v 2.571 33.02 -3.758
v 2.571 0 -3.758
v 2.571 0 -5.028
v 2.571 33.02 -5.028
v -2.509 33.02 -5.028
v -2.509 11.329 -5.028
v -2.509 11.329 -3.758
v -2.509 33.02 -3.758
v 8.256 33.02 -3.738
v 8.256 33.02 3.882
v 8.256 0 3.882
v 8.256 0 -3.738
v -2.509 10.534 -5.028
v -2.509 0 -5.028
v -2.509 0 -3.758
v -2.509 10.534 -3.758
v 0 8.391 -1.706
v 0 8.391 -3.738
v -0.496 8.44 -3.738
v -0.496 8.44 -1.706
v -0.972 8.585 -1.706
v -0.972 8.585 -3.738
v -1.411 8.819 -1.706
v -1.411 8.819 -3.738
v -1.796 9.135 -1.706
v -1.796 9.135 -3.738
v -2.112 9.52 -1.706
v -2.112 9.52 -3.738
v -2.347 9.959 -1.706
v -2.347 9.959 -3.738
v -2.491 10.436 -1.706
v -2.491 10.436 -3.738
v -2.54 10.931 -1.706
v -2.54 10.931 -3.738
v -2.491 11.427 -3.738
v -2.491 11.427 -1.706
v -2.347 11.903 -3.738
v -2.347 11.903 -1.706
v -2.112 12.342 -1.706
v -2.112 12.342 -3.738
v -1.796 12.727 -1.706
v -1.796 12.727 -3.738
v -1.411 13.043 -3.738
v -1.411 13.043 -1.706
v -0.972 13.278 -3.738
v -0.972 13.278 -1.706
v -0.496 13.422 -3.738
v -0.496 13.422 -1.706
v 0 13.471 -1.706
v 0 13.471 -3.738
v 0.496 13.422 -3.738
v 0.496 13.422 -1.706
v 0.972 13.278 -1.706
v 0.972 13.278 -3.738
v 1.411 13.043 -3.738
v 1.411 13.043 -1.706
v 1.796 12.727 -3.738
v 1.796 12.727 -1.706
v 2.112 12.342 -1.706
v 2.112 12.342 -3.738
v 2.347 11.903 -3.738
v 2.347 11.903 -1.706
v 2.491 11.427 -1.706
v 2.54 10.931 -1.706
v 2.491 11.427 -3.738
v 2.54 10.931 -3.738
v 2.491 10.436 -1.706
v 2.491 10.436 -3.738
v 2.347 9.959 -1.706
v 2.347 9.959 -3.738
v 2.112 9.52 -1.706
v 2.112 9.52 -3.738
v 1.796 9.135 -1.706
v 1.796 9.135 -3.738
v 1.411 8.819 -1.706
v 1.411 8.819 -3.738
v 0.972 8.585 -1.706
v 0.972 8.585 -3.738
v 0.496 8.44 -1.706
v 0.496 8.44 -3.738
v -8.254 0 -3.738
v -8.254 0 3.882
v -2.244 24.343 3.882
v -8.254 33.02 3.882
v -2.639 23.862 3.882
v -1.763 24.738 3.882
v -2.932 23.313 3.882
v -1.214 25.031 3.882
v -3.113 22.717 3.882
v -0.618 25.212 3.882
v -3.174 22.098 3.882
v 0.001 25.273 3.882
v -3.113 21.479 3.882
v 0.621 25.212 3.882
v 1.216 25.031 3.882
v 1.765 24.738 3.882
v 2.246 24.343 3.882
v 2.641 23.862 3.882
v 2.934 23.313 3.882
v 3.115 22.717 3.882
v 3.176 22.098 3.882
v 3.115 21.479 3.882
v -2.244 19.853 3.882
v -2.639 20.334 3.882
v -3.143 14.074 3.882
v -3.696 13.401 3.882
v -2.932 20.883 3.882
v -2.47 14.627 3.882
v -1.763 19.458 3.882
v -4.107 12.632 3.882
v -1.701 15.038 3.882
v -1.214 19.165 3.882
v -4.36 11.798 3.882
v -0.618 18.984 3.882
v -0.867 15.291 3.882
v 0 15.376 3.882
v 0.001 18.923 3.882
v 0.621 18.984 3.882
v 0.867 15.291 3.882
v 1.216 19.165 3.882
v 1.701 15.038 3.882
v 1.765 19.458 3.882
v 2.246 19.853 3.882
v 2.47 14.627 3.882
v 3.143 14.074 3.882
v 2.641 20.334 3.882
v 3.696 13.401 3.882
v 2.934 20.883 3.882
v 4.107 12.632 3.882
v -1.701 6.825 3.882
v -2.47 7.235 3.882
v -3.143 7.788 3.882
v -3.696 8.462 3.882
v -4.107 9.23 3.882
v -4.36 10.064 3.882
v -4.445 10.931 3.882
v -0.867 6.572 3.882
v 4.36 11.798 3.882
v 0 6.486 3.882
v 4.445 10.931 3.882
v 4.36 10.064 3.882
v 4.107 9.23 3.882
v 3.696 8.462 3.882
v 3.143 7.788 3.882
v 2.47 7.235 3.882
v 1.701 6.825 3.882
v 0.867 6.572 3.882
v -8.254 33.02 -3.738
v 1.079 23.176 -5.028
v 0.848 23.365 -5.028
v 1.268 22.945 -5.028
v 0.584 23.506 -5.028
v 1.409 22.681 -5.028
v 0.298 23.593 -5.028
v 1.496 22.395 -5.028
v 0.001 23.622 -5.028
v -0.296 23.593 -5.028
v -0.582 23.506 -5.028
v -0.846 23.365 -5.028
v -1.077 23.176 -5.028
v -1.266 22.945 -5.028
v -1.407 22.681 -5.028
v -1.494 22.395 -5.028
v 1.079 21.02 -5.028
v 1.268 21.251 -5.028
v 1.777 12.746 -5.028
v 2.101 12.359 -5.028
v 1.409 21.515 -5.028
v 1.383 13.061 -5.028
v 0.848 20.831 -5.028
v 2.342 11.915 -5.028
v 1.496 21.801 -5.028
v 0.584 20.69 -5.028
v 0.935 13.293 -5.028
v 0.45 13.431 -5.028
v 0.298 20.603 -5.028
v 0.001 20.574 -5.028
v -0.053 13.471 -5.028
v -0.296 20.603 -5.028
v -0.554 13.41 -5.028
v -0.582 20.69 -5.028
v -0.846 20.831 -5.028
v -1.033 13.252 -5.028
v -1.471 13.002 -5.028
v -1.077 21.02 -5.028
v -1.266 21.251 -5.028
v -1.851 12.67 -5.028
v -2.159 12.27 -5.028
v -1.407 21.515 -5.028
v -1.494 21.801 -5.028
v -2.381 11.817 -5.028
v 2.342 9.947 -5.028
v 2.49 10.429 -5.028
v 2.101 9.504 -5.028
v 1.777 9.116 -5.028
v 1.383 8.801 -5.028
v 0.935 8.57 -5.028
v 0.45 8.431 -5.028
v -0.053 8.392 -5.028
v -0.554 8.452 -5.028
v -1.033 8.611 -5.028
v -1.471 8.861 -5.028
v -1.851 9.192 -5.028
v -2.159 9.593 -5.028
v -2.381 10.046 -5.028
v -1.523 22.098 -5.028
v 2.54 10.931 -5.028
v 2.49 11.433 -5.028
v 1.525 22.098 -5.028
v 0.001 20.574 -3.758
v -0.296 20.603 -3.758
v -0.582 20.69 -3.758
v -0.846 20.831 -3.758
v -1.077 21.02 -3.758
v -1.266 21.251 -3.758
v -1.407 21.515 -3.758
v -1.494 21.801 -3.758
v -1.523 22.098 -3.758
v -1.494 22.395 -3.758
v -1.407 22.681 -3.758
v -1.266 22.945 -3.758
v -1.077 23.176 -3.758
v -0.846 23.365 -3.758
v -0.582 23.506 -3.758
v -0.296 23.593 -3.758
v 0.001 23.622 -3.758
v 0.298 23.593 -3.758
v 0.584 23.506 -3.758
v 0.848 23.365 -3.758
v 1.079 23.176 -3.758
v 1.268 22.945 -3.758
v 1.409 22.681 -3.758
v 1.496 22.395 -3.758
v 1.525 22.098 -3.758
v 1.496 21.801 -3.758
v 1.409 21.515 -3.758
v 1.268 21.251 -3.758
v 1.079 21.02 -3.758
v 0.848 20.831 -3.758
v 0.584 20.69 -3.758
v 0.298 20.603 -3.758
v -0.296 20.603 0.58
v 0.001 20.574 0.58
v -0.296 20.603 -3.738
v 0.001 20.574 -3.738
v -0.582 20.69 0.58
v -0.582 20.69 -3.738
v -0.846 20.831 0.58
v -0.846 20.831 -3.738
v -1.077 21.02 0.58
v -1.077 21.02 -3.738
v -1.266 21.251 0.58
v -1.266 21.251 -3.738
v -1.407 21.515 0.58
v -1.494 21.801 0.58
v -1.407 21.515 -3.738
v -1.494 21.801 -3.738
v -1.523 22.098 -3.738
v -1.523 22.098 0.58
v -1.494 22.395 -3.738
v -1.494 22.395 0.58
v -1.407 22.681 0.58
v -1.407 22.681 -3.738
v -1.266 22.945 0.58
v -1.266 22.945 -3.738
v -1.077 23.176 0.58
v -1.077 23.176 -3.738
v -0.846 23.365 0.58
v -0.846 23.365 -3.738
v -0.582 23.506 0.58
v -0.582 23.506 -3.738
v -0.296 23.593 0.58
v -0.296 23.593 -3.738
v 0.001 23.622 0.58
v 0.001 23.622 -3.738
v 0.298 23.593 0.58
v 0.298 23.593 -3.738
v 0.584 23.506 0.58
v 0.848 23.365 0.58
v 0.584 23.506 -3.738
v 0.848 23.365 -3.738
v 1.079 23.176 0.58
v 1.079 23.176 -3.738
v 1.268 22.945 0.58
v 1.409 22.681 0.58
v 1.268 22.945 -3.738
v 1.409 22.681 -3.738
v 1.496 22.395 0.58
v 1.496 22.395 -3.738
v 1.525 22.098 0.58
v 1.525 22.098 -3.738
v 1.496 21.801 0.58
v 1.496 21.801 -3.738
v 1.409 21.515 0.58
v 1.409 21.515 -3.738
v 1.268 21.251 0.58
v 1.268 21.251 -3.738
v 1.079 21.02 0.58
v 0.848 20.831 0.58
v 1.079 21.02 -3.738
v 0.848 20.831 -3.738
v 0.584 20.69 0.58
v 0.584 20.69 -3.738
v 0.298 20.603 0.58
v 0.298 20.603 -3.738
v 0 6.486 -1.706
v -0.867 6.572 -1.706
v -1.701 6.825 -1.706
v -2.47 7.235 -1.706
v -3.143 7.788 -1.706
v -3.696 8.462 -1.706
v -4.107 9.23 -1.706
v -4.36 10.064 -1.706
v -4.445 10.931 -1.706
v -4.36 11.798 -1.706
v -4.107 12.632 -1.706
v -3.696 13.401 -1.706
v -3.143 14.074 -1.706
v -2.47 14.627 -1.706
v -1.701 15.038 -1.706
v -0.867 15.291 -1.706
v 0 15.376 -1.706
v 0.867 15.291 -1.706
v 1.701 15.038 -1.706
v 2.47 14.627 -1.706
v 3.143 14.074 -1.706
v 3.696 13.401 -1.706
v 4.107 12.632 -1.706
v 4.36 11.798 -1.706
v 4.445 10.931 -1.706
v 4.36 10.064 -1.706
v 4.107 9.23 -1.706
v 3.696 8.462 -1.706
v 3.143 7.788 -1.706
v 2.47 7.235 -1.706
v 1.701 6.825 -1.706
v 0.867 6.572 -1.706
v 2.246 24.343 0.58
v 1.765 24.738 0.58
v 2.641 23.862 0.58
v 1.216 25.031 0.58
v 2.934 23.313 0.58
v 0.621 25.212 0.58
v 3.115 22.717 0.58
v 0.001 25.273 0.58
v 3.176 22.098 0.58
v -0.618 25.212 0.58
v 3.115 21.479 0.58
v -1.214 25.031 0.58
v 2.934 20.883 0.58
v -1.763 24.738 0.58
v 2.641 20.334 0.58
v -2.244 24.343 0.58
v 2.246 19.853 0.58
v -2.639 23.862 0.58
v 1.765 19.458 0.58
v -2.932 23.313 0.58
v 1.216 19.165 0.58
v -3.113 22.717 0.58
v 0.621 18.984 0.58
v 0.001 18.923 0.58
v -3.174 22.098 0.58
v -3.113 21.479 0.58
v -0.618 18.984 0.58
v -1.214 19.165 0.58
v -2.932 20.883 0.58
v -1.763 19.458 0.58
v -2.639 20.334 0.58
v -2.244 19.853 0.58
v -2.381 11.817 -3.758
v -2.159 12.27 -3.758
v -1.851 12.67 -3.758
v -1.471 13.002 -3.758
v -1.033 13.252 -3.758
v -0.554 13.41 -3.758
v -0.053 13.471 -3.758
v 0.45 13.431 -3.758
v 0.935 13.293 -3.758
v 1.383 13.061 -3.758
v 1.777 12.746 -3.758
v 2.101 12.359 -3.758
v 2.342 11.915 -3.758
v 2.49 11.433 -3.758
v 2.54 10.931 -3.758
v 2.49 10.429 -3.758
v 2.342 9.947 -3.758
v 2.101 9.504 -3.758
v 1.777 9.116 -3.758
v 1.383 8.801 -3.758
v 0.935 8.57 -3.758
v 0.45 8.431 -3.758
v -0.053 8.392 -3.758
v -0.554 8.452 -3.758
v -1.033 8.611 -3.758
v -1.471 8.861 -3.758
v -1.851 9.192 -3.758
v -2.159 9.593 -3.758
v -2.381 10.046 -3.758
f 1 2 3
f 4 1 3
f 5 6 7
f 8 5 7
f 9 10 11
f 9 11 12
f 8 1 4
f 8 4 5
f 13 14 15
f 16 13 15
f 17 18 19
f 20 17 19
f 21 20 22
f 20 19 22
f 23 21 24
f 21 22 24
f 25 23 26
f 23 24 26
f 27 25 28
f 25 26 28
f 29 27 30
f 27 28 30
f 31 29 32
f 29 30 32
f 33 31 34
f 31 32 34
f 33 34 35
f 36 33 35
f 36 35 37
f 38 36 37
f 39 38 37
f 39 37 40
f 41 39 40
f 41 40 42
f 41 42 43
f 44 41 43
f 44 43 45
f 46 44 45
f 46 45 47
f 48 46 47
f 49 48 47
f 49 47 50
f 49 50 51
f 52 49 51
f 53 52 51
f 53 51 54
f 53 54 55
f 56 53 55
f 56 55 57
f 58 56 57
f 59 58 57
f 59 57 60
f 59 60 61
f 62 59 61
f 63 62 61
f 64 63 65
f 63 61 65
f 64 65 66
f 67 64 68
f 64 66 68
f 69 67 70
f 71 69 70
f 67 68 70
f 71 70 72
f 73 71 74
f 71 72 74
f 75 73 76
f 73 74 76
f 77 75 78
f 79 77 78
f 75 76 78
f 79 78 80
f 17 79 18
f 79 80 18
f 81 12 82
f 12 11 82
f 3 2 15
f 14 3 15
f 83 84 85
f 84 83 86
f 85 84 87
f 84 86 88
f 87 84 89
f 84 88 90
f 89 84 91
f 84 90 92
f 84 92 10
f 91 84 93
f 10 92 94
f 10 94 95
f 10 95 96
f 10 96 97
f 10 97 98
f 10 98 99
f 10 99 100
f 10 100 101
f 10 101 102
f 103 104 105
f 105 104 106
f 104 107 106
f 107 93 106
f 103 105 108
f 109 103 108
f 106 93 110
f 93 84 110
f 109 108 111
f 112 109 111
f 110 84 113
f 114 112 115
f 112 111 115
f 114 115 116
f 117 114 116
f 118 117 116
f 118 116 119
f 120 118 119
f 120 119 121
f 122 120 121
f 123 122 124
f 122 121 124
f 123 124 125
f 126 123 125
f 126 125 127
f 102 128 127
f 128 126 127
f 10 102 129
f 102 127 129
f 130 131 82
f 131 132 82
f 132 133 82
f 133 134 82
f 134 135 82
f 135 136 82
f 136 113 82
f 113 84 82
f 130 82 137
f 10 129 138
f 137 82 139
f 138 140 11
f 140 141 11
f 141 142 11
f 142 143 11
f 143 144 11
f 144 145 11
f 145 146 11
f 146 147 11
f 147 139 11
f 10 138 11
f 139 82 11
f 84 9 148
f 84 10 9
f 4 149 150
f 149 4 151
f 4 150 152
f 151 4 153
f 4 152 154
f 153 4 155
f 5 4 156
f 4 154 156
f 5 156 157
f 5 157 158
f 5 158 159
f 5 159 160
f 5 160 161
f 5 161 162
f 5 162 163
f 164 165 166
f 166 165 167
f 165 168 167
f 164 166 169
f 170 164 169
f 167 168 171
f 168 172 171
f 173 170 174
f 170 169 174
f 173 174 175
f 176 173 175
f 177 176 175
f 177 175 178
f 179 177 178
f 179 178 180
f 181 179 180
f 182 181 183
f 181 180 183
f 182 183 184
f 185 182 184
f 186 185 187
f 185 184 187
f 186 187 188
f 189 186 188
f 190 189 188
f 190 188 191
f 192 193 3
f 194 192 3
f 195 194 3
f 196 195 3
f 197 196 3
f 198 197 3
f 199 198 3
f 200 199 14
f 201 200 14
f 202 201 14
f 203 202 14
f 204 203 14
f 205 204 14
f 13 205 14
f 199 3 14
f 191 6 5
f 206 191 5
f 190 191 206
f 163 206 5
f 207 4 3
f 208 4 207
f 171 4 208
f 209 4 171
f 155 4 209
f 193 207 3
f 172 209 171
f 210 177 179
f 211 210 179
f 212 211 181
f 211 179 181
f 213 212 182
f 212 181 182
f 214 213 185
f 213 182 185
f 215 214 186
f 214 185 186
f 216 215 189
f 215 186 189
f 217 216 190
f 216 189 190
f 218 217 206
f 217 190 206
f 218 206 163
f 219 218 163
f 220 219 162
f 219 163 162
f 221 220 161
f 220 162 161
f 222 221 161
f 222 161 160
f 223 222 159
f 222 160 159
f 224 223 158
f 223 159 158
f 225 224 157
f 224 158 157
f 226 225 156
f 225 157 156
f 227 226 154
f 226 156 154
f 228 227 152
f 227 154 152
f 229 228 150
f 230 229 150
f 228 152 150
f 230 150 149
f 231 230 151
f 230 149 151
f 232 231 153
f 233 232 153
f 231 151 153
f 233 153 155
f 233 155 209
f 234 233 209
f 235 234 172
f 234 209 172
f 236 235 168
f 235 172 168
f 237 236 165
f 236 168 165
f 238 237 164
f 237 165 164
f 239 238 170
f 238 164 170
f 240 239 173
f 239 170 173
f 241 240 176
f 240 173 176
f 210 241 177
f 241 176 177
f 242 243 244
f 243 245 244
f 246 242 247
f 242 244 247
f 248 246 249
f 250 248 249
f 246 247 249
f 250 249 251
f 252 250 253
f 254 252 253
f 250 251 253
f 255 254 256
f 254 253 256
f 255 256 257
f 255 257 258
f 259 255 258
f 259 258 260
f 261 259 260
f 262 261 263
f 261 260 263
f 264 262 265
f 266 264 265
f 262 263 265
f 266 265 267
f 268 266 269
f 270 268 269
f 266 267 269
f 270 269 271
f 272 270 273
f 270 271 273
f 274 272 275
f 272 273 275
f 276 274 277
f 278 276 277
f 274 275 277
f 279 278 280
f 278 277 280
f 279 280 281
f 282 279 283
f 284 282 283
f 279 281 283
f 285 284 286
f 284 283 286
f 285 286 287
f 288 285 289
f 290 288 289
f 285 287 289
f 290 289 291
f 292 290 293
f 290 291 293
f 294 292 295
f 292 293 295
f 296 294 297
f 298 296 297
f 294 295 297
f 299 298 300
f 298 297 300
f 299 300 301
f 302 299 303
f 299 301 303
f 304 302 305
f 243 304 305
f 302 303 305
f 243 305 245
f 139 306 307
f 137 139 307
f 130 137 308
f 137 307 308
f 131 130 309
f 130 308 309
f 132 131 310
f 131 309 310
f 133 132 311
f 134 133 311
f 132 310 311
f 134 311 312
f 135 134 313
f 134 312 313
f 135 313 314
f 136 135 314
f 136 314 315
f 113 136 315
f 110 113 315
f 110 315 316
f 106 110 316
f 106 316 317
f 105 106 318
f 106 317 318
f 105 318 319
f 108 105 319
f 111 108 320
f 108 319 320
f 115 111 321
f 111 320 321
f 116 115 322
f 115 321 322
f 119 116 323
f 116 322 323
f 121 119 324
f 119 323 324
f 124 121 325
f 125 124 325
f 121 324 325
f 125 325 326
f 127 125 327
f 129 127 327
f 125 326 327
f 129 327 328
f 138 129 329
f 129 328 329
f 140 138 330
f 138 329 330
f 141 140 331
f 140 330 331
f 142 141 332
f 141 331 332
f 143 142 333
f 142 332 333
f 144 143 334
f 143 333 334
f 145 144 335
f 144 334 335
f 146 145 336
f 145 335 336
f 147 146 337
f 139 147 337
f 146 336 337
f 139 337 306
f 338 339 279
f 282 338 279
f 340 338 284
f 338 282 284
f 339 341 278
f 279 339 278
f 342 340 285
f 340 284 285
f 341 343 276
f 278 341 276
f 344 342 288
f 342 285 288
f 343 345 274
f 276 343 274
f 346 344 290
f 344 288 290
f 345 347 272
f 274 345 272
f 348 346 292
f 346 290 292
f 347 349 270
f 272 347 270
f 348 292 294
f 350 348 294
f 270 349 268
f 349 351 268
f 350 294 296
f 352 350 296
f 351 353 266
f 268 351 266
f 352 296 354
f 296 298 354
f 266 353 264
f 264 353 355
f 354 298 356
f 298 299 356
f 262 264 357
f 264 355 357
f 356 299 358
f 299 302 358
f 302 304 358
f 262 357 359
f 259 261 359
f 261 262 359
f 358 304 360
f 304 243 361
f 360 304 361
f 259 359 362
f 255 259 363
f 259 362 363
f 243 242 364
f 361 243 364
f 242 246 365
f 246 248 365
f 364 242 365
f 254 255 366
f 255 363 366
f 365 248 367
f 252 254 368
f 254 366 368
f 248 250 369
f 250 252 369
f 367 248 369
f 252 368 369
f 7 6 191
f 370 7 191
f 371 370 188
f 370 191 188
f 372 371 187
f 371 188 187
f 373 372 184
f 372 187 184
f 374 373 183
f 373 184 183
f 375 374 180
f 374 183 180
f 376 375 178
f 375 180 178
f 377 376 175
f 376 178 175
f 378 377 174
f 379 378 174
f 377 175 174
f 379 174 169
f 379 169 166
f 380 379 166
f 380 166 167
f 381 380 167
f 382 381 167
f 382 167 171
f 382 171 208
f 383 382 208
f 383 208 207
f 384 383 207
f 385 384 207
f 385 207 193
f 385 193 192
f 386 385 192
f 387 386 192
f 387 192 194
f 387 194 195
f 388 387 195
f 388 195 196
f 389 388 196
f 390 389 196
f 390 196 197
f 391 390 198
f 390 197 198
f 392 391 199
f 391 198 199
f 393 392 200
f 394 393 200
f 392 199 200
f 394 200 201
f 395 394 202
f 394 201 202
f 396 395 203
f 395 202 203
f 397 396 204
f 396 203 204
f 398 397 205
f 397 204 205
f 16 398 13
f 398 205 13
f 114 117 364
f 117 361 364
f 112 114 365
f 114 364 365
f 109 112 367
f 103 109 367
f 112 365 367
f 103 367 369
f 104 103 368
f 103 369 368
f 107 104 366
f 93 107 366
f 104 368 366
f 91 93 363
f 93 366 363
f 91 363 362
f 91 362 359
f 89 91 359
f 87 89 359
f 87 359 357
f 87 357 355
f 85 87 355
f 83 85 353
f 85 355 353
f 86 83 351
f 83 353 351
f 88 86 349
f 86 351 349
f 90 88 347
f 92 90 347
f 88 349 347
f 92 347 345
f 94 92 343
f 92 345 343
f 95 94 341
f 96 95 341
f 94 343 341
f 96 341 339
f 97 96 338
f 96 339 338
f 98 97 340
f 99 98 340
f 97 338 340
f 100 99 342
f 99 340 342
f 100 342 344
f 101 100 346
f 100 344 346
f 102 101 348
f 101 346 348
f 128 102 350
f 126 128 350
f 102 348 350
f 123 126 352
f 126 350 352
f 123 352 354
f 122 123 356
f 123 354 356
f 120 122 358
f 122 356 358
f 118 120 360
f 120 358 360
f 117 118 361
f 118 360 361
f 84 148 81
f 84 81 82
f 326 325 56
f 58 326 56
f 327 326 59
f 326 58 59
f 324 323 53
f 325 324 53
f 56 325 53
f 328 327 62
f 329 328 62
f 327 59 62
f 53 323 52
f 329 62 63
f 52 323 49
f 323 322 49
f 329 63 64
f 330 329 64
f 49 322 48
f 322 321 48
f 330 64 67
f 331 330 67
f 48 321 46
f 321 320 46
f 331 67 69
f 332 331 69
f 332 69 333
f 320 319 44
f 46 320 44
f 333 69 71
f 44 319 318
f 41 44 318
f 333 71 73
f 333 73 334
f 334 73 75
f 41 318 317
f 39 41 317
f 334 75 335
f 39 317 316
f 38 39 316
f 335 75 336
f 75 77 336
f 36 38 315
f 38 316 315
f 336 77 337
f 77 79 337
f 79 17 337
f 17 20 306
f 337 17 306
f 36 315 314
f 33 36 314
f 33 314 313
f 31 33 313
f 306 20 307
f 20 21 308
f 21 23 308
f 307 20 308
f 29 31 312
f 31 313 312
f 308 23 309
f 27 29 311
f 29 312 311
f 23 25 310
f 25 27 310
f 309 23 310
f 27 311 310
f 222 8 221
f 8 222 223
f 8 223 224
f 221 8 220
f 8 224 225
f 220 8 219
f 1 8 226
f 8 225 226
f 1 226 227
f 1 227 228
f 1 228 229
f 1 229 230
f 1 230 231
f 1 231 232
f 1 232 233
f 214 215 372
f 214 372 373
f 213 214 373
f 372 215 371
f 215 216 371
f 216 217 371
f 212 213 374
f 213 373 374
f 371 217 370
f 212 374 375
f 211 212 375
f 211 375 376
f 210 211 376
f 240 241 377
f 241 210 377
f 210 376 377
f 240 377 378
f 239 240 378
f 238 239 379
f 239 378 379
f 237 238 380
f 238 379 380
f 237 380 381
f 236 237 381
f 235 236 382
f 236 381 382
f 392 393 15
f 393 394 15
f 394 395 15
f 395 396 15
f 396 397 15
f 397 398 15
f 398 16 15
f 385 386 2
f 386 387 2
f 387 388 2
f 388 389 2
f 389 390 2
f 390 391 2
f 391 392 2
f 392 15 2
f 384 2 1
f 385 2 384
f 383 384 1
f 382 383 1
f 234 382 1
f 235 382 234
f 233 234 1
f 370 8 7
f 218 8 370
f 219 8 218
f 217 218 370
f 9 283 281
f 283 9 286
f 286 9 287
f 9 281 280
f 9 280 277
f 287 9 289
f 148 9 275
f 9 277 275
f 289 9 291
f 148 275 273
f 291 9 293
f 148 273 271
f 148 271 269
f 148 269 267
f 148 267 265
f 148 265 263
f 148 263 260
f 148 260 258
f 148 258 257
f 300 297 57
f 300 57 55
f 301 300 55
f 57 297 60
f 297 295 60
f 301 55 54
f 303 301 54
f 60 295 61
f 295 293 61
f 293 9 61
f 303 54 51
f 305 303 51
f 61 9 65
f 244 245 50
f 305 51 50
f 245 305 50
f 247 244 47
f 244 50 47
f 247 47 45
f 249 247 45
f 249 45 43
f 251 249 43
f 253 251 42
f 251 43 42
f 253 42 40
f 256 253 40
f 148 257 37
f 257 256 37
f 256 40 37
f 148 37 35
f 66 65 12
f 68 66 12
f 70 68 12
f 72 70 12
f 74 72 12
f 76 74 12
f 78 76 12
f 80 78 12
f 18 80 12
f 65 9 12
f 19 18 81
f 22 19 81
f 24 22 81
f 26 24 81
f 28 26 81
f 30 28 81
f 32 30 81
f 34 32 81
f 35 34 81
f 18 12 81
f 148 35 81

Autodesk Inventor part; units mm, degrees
ref_plane "YZ Plane" through (0, 0, 0) normal (1, 0, 0) x (0, 1, 0)
ref_plane "XZ Plane" through (0, 0, 0) normal (0, 1, 0) x (-1, 0, 0)
ref_plane "XY Plane" through (0, 0, 0) normal (0, 0, 1) x (1, 0, 0)
sketch "Sketch1" plane through (0, 0, 0) normal (0, 1, 0) x (-1, 0, 0)
  line L0 (8.2539, 3.8822) -> (-8.2561, 3.8822)
  line L1 (-8.2561, 3.8822) -> (-8.2561, -3.7378)
  line L2 (-8.2561, -3.7378) -> (8.2539, -3.7378)
  line L3 (8.2539, -3.7378) -> (8.2539, 3.8822)
  line L4 (2.5087, -3.7583) -> (-2.5713, -3.7583)
  line L5 (-2.5713, -3.7583) -> (-2.5713, -5.0283)
  line L6 (-2.5713, -5.0283) -> (2.5087, -5.0283)
  line L7 (2.5087, -5.0283) -> (2.5087, -3.7583)
  point P0 (0, 0)
  dimension "d0" = 16.51
  dimension "d1" = 7.62
  dimension "d2" = 5.08
  dimension "d3" = 1.27
extrude "Extrusion1" add sketch "Sketch1" along normal blind 33.02
sketch "Sketch4" plane through (-8.2539, 0, 3.8822) normal (0, 0, 1) x (1, 0, 0)
  line L0 (8.2539, 0) -> (8.2539, 10.922)
  line L1 (0, 33.02) -> (16.51, 33.02) projected
  line L2 (8.255, 33.02) -> (8.255, 22.098)
  dimension "d8" = 10.922
  dimension "d9" = 10.922
hole "Hole1" at (0.0011, 22.098, 3.8822) direction (0, 0, -1) diameter 3.048 end through all counterbore diameter 6.35 counterbore depth 3.302
sketch "Sketch6" plane through (-8.2539, 0, 3.8822) normal (0, 0, 1) x (1, 0, 0)
  line L0 (8.2539, 0) -> (8.2539, 10.9312)
hole "Hole4" at (0, 10.9312, 3.8822) direction (0, 0, -1) diameter 5.08 end through all counterbore diameter 8.89 counterbore depth 5.588
